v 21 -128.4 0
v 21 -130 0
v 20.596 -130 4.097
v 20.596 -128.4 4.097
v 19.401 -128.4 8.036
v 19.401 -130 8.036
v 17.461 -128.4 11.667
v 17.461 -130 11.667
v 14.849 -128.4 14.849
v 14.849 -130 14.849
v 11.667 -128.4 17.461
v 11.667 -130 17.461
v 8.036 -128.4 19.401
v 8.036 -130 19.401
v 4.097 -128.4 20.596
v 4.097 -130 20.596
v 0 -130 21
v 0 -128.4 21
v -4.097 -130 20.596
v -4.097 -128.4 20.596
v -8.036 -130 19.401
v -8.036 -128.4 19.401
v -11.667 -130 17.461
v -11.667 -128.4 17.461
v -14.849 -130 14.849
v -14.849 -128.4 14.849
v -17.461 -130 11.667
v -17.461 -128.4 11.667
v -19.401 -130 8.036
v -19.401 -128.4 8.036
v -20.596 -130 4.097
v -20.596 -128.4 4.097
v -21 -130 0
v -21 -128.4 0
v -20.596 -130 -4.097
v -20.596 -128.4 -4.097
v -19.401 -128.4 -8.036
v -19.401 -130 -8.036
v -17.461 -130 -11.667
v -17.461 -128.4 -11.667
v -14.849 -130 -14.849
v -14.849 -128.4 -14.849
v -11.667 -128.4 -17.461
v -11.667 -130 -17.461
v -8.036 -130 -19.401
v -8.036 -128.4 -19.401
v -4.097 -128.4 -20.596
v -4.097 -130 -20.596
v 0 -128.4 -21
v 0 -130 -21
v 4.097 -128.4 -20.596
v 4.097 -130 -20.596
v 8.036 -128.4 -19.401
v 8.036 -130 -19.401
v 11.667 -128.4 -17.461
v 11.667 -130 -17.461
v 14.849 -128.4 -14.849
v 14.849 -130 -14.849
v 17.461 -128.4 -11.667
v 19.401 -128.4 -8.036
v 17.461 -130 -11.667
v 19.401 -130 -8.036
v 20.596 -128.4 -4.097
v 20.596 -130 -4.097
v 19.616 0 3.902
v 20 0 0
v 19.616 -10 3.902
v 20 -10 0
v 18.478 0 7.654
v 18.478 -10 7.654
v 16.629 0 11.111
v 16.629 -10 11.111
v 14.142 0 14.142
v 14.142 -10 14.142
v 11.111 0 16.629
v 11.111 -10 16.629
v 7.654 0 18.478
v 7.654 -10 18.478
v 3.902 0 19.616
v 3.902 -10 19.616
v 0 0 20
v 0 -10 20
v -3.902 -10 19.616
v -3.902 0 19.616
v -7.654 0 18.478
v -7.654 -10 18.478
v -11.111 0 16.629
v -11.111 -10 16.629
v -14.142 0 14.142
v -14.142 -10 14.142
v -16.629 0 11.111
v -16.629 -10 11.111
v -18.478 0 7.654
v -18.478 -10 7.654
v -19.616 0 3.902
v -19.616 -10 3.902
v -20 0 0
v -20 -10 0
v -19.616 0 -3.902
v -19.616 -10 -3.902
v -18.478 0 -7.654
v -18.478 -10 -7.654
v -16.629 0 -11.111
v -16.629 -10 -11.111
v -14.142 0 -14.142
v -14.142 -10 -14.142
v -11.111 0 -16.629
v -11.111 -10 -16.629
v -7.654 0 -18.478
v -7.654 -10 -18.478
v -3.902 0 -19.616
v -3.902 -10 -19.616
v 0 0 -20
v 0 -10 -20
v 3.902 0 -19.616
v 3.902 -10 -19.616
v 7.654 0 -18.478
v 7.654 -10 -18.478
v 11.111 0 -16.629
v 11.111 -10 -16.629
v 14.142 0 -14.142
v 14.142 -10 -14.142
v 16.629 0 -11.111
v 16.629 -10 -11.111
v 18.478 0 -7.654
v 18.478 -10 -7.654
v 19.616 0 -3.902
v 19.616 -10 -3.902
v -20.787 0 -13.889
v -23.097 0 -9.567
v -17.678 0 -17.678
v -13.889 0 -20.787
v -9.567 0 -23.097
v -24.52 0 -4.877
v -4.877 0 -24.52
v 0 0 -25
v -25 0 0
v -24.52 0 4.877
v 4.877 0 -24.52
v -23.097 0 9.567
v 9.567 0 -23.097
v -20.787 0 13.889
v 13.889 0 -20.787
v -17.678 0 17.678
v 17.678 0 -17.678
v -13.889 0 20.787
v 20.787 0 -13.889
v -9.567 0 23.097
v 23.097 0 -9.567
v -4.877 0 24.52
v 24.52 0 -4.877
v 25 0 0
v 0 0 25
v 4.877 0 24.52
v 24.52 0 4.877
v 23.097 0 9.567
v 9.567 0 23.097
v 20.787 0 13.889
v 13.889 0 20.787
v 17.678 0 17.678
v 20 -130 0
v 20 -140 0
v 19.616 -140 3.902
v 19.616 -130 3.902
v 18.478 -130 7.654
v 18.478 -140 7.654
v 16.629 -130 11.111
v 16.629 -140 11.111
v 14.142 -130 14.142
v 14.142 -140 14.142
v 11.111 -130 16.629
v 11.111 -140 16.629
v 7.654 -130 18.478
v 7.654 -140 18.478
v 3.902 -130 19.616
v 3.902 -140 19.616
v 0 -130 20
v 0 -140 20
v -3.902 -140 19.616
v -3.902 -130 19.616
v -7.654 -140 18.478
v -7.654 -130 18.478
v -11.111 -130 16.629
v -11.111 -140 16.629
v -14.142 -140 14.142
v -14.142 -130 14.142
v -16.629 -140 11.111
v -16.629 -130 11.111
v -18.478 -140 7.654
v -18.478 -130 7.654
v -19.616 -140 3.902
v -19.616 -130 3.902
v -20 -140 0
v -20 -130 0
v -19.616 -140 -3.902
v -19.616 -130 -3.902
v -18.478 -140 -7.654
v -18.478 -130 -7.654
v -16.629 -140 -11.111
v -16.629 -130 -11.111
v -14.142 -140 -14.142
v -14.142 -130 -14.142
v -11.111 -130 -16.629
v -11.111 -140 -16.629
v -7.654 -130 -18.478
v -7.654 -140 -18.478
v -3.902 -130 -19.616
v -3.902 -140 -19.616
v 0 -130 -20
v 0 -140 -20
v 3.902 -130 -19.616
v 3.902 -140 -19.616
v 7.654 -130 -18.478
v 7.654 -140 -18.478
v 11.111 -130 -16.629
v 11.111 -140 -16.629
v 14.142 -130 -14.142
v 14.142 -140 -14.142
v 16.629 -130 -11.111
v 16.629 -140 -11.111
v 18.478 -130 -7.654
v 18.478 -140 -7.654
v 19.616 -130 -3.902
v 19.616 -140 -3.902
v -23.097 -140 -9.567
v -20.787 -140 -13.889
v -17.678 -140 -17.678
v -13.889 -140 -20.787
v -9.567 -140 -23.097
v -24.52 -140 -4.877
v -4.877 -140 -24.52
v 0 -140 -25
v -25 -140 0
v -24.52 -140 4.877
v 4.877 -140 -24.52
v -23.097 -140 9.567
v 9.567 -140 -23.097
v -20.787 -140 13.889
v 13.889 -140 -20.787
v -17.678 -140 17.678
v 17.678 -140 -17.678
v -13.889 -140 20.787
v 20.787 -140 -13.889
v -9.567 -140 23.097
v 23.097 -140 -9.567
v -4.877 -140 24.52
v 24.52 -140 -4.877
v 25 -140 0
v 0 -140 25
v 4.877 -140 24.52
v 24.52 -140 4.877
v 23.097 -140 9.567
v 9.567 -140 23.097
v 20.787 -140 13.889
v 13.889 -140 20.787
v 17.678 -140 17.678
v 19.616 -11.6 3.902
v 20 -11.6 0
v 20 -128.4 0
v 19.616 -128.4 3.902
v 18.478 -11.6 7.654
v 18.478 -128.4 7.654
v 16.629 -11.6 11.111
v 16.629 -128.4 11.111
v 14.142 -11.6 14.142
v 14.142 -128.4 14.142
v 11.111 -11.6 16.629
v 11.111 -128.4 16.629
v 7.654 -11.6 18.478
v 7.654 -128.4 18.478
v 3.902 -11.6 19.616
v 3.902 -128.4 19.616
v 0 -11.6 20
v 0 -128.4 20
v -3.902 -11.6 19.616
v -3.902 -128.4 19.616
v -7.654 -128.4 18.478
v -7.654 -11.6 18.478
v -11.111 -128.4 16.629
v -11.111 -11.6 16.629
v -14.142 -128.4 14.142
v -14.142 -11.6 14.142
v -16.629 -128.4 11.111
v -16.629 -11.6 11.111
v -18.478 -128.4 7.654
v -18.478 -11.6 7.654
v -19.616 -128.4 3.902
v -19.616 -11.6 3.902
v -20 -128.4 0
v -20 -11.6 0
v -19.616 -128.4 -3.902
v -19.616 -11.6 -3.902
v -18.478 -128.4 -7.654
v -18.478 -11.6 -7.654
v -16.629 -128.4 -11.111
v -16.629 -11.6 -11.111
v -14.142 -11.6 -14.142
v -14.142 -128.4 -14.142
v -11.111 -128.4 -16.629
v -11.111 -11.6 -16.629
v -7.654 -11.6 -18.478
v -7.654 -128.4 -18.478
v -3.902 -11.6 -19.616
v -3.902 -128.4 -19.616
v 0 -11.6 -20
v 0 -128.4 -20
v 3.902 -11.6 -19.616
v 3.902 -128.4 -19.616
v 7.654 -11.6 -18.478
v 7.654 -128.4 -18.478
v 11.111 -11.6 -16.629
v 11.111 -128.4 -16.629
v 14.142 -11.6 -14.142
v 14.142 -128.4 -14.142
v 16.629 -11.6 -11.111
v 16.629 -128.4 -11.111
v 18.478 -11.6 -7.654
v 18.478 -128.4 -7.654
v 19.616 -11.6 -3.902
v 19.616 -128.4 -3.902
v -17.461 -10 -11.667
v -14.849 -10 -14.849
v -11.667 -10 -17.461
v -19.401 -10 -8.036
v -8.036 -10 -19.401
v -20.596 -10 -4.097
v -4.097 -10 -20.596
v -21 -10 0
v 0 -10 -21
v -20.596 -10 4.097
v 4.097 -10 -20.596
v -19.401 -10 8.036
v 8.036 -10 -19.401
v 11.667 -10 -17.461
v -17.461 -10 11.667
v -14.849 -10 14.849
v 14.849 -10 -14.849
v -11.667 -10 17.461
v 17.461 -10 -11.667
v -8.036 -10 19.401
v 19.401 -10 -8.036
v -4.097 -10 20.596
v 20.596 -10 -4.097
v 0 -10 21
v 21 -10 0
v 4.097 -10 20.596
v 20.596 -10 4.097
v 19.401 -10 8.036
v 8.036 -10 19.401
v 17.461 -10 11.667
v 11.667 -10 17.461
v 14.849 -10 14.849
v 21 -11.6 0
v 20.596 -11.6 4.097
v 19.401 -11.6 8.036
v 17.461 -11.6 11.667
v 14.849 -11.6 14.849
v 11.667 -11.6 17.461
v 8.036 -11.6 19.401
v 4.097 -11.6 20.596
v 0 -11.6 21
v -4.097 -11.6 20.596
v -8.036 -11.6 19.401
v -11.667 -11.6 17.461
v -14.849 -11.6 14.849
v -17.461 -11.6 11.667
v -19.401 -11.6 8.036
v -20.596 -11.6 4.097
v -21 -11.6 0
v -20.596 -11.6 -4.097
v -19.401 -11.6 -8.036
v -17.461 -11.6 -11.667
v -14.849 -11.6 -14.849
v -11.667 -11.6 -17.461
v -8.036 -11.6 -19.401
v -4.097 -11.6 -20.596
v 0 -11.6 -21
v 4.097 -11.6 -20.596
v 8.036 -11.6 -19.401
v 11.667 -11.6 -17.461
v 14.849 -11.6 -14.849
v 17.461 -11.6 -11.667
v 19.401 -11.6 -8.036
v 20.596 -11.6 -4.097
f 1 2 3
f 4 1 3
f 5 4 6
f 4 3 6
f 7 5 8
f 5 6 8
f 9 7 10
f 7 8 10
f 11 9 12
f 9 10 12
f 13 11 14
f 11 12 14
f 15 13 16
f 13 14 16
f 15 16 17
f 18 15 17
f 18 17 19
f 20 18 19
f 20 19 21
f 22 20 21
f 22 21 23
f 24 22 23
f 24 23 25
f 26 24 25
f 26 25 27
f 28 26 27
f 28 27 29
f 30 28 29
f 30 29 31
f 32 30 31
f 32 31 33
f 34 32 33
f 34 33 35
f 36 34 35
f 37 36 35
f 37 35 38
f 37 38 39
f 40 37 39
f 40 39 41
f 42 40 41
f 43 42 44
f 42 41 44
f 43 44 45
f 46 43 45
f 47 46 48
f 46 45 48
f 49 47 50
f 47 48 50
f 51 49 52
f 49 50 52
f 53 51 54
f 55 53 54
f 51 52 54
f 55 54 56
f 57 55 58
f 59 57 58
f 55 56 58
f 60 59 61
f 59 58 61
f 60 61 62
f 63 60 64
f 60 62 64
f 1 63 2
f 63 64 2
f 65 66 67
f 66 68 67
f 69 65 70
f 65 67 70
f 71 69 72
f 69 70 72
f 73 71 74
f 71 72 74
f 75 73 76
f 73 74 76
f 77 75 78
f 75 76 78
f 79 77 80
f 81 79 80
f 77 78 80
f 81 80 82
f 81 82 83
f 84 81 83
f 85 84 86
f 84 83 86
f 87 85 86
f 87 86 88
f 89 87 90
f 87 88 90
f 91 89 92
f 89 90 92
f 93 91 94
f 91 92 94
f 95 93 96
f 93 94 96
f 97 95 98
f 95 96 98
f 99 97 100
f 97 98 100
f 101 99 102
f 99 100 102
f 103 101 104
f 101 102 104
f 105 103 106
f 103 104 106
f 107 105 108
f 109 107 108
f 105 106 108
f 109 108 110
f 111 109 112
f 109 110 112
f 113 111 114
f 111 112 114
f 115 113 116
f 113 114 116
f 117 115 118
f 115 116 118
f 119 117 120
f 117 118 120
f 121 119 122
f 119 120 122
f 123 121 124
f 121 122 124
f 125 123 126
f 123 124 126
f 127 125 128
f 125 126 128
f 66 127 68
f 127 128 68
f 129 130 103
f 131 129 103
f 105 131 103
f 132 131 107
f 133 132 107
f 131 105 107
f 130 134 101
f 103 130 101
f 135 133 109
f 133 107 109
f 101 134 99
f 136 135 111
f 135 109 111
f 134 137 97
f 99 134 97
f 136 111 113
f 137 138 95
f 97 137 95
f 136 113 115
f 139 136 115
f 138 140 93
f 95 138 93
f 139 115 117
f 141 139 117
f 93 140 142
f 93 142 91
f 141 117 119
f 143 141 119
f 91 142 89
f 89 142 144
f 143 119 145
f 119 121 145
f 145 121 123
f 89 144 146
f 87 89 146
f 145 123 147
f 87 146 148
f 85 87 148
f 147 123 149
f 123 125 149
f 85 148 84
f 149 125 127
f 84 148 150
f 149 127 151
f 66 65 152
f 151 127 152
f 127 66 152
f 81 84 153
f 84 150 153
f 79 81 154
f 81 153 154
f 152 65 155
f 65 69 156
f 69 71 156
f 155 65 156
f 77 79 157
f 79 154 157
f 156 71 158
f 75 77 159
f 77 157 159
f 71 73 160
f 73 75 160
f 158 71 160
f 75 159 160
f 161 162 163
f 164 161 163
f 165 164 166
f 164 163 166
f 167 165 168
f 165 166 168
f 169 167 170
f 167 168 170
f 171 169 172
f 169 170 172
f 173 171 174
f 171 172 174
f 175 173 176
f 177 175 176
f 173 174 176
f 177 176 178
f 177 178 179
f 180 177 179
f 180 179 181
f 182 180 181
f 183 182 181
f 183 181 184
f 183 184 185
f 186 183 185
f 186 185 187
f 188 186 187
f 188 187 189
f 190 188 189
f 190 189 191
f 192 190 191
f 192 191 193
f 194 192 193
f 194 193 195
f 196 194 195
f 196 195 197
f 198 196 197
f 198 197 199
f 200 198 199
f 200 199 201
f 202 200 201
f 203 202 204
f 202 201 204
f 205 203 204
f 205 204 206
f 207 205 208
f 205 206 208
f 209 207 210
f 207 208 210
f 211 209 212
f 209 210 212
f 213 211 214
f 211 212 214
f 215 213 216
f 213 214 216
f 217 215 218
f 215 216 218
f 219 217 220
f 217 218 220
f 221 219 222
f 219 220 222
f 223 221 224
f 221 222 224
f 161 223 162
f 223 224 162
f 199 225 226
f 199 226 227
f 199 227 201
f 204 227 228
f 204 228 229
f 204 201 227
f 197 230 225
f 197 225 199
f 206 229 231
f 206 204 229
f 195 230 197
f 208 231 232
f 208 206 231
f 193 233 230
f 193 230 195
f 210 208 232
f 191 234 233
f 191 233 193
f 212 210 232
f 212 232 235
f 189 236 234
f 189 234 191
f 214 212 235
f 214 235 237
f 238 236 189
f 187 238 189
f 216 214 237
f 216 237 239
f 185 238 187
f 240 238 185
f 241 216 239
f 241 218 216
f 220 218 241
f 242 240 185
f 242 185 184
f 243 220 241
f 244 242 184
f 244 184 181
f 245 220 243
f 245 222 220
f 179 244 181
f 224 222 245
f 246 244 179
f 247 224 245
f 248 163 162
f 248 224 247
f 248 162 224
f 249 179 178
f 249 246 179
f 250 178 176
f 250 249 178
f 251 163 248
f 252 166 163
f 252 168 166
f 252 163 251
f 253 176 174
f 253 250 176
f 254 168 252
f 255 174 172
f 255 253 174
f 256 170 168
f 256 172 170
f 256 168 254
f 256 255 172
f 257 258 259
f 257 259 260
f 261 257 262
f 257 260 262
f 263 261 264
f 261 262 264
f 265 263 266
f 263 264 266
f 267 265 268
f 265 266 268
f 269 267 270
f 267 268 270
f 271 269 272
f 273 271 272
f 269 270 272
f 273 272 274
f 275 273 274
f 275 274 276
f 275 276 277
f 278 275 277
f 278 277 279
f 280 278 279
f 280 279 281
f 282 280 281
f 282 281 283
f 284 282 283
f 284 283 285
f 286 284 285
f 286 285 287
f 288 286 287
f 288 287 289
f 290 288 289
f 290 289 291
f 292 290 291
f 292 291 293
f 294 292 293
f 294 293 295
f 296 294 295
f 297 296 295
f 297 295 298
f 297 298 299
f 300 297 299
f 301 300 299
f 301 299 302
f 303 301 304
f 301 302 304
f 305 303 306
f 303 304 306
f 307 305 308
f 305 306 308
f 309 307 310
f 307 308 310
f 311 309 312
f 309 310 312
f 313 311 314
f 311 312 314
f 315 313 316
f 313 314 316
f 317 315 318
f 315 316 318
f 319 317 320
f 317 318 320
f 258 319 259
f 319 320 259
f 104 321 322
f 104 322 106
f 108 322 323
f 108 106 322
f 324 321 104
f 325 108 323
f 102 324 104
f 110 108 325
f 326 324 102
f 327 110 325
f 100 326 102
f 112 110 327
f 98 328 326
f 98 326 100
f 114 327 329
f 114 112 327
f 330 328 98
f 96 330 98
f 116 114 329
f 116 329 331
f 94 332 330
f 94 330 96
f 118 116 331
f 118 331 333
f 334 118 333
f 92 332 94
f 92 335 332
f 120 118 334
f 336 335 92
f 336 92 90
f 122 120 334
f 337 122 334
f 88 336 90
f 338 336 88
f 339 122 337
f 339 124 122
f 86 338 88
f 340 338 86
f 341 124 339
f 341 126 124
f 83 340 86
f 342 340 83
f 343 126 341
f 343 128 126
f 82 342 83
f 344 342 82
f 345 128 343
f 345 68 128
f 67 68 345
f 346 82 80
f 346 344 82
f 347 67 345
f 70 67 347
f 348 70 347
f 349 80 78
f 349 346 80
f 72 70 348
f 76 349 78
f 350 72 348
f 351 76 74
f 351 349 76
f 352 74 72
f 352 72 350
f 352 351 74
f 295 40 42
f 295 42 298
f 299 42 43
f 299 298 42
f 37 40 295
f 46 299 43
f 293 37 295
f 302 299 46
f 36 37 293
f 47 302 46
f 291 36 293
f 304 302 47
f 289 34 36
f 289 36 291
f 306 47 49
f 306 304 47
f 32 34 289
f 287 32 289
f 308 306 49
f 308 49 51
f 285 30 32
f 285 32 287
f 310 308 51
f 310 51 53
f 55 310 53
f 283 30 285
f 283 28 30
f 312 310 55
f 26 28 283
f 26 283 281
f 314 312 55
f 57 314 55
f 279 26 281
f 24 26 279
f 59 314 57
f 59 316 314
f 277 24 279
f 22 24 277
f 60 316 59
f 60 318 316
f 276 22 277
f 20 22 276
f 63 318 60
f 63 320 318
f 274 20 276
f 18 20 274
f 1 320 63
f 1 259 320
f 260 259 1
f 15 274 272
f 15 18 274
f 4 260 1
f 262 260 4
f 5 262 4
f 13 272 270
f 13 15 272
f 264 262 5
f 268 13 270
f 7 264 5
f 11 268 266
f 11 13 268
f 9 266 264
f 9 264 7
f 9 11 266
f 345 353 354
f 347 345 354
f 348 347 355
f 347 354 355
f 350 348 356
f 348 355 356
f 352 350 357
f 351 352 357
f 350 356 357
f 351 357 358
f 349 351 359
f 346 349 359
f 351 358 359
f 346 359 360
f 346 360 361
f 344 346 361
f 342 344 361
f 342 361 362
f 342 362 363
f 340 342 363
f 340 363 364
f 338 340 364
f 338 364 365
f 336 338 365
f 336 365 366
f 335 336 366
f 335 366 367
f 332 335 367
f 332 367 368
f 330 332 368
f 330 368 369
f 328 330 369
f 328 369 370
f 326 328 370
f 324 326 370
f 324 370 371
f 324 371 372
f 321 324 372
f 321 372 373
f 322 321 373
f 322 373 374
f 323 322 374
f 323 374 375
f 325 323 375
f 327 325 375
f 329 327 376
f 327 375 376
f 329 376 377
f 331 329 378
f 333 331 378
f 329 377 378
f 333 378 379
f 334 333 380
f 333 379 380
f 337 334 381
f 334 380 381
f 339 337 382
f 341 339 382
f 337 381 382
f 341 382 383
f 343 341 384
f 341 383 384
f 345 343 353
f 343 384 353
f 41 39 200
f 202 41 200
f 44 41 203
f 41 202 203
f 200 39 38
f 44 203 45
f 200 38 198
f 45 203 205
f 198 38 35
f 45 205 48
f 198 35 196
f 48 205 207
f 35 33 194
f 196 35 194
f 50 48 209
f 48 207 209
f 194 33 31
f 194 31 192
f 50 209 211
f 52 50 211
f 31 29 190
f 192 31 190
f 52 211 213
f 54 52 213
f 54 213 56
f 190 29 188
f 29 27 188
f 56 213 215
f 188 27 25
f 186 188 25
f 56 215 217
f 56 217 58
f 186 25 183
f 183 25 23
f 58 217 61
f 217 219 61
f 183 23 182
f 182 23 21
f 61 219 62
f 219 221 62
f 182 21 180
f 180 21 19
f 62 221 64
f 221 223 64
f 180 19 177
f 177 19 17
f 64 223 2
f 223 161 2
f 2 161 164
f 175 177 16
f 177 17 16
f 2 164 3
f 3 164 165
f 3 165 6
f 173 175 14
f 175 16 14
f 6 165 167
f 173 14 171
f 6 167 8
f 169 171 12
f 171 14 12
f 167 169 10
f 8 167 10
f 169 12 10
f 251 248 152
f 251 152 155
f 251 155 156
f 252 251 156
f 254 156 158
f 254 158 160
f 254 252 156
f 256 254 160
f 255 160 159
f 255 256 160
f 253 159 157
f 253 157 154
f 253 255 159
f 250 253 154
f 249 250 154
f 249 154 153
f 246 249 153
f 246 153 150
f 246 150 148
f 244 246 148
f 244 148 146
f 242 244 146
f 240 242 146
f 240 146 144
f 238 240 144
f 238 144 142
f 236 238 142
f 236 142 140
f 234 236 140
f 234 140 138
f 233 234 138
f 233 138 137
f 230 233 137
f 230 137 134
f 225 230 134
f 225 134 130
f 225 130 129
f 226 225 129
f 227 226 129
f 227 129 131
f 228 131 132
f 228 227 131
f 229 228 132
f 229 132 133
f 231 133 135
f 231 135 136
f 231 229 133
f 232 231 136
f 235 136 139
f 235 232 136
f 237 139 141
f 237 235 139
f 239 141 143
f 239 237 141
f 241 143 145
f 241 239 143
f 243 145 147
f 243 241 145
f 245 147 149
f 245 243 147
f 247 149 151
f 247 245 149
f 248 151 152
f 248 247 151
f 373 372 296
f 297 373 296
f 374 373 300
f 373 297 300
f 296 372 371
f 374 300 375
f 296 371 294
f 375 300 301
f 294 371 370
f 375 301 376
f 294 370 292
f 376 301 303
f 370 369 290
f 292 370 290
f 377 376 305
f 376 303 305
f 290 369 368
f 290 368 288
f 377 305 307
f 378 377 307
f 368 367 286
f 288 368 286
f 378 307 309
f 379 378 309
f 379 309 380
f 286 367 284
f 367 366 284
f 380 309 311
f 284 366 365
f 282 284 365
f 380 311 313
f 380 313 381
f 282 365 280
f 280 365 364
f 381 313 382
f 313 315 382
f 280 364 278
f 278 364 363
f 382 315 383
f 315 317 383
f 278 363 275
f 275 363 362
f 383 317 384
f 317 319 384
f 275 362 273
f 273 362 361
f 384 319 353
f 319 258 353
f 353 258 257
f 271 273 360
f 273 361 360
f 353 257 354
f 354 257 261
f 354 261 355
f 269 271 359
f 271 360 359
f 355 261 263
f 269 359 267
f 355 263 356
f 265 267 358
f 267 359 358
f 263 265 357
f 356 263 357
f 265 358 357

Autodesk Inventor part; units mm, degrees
ref_plane "YZ Plane" through (0, 0, 0) normal (1, 0, 0) x (0, 1, 0)
ref_plane "XZ Plane" through (0, 0, 0) normal (0, 1, 0) x (-1, 0, 0)
ref_plane "XY Plane" through (0, 0, 0) normal (0, 0, 1) x (1, 0, 0)
sketch "Эскиз1" plane through (0, 0, 0) normal (0, 0, 1) x (1, 0, 0)
  line L0 (0, 0) -> (0, -140)
  line L1 (0, 0) -> (20, 0) construction
  line L2 (25, 0) -> (25, -140)
  line L3 (25, -140) -> (20, -140)
  line L4 (20, 0) -> (20, -10)
  line L5 (20, -10) -> (21, -10)
  line L6 (21, -10) -> (21, -11.6)
  line L7 (21, -11.6) -> (20, -11.6)
  line L8 (20, -11.6) -> (20, -128.4)
  line L9 (20, -128.4) -> (21, -128.4)
  line L10 (21, -128.4) -> (21, -130)
  line L11 (21, -130) -> (20, -130)
  line L12 (20, -130) -> (20, -140)
  line L13 (20, -140) -> (0, -140) construction
  line L14 (20, 0) -> (25, 0)
  point P0 (20, -7)
  dimension "d0" = 140
  dimension "d1" = 50
  dimension "d3" = 42
  dimension "d4" = 40
  dimension "d5" = 1.6
  dimension "d6" = 1.6
  dimension "d13" = 10
  dimension "d14" = 10
revolve "Вращение1" add sketch "Эскиз1" angle 360 about axis through (0, 0, 0) along (0, -1, 0)
equation "\"d14\" = my_parameter"
equation "\"my_parameter\" = 10"
properties part number "корпус"
